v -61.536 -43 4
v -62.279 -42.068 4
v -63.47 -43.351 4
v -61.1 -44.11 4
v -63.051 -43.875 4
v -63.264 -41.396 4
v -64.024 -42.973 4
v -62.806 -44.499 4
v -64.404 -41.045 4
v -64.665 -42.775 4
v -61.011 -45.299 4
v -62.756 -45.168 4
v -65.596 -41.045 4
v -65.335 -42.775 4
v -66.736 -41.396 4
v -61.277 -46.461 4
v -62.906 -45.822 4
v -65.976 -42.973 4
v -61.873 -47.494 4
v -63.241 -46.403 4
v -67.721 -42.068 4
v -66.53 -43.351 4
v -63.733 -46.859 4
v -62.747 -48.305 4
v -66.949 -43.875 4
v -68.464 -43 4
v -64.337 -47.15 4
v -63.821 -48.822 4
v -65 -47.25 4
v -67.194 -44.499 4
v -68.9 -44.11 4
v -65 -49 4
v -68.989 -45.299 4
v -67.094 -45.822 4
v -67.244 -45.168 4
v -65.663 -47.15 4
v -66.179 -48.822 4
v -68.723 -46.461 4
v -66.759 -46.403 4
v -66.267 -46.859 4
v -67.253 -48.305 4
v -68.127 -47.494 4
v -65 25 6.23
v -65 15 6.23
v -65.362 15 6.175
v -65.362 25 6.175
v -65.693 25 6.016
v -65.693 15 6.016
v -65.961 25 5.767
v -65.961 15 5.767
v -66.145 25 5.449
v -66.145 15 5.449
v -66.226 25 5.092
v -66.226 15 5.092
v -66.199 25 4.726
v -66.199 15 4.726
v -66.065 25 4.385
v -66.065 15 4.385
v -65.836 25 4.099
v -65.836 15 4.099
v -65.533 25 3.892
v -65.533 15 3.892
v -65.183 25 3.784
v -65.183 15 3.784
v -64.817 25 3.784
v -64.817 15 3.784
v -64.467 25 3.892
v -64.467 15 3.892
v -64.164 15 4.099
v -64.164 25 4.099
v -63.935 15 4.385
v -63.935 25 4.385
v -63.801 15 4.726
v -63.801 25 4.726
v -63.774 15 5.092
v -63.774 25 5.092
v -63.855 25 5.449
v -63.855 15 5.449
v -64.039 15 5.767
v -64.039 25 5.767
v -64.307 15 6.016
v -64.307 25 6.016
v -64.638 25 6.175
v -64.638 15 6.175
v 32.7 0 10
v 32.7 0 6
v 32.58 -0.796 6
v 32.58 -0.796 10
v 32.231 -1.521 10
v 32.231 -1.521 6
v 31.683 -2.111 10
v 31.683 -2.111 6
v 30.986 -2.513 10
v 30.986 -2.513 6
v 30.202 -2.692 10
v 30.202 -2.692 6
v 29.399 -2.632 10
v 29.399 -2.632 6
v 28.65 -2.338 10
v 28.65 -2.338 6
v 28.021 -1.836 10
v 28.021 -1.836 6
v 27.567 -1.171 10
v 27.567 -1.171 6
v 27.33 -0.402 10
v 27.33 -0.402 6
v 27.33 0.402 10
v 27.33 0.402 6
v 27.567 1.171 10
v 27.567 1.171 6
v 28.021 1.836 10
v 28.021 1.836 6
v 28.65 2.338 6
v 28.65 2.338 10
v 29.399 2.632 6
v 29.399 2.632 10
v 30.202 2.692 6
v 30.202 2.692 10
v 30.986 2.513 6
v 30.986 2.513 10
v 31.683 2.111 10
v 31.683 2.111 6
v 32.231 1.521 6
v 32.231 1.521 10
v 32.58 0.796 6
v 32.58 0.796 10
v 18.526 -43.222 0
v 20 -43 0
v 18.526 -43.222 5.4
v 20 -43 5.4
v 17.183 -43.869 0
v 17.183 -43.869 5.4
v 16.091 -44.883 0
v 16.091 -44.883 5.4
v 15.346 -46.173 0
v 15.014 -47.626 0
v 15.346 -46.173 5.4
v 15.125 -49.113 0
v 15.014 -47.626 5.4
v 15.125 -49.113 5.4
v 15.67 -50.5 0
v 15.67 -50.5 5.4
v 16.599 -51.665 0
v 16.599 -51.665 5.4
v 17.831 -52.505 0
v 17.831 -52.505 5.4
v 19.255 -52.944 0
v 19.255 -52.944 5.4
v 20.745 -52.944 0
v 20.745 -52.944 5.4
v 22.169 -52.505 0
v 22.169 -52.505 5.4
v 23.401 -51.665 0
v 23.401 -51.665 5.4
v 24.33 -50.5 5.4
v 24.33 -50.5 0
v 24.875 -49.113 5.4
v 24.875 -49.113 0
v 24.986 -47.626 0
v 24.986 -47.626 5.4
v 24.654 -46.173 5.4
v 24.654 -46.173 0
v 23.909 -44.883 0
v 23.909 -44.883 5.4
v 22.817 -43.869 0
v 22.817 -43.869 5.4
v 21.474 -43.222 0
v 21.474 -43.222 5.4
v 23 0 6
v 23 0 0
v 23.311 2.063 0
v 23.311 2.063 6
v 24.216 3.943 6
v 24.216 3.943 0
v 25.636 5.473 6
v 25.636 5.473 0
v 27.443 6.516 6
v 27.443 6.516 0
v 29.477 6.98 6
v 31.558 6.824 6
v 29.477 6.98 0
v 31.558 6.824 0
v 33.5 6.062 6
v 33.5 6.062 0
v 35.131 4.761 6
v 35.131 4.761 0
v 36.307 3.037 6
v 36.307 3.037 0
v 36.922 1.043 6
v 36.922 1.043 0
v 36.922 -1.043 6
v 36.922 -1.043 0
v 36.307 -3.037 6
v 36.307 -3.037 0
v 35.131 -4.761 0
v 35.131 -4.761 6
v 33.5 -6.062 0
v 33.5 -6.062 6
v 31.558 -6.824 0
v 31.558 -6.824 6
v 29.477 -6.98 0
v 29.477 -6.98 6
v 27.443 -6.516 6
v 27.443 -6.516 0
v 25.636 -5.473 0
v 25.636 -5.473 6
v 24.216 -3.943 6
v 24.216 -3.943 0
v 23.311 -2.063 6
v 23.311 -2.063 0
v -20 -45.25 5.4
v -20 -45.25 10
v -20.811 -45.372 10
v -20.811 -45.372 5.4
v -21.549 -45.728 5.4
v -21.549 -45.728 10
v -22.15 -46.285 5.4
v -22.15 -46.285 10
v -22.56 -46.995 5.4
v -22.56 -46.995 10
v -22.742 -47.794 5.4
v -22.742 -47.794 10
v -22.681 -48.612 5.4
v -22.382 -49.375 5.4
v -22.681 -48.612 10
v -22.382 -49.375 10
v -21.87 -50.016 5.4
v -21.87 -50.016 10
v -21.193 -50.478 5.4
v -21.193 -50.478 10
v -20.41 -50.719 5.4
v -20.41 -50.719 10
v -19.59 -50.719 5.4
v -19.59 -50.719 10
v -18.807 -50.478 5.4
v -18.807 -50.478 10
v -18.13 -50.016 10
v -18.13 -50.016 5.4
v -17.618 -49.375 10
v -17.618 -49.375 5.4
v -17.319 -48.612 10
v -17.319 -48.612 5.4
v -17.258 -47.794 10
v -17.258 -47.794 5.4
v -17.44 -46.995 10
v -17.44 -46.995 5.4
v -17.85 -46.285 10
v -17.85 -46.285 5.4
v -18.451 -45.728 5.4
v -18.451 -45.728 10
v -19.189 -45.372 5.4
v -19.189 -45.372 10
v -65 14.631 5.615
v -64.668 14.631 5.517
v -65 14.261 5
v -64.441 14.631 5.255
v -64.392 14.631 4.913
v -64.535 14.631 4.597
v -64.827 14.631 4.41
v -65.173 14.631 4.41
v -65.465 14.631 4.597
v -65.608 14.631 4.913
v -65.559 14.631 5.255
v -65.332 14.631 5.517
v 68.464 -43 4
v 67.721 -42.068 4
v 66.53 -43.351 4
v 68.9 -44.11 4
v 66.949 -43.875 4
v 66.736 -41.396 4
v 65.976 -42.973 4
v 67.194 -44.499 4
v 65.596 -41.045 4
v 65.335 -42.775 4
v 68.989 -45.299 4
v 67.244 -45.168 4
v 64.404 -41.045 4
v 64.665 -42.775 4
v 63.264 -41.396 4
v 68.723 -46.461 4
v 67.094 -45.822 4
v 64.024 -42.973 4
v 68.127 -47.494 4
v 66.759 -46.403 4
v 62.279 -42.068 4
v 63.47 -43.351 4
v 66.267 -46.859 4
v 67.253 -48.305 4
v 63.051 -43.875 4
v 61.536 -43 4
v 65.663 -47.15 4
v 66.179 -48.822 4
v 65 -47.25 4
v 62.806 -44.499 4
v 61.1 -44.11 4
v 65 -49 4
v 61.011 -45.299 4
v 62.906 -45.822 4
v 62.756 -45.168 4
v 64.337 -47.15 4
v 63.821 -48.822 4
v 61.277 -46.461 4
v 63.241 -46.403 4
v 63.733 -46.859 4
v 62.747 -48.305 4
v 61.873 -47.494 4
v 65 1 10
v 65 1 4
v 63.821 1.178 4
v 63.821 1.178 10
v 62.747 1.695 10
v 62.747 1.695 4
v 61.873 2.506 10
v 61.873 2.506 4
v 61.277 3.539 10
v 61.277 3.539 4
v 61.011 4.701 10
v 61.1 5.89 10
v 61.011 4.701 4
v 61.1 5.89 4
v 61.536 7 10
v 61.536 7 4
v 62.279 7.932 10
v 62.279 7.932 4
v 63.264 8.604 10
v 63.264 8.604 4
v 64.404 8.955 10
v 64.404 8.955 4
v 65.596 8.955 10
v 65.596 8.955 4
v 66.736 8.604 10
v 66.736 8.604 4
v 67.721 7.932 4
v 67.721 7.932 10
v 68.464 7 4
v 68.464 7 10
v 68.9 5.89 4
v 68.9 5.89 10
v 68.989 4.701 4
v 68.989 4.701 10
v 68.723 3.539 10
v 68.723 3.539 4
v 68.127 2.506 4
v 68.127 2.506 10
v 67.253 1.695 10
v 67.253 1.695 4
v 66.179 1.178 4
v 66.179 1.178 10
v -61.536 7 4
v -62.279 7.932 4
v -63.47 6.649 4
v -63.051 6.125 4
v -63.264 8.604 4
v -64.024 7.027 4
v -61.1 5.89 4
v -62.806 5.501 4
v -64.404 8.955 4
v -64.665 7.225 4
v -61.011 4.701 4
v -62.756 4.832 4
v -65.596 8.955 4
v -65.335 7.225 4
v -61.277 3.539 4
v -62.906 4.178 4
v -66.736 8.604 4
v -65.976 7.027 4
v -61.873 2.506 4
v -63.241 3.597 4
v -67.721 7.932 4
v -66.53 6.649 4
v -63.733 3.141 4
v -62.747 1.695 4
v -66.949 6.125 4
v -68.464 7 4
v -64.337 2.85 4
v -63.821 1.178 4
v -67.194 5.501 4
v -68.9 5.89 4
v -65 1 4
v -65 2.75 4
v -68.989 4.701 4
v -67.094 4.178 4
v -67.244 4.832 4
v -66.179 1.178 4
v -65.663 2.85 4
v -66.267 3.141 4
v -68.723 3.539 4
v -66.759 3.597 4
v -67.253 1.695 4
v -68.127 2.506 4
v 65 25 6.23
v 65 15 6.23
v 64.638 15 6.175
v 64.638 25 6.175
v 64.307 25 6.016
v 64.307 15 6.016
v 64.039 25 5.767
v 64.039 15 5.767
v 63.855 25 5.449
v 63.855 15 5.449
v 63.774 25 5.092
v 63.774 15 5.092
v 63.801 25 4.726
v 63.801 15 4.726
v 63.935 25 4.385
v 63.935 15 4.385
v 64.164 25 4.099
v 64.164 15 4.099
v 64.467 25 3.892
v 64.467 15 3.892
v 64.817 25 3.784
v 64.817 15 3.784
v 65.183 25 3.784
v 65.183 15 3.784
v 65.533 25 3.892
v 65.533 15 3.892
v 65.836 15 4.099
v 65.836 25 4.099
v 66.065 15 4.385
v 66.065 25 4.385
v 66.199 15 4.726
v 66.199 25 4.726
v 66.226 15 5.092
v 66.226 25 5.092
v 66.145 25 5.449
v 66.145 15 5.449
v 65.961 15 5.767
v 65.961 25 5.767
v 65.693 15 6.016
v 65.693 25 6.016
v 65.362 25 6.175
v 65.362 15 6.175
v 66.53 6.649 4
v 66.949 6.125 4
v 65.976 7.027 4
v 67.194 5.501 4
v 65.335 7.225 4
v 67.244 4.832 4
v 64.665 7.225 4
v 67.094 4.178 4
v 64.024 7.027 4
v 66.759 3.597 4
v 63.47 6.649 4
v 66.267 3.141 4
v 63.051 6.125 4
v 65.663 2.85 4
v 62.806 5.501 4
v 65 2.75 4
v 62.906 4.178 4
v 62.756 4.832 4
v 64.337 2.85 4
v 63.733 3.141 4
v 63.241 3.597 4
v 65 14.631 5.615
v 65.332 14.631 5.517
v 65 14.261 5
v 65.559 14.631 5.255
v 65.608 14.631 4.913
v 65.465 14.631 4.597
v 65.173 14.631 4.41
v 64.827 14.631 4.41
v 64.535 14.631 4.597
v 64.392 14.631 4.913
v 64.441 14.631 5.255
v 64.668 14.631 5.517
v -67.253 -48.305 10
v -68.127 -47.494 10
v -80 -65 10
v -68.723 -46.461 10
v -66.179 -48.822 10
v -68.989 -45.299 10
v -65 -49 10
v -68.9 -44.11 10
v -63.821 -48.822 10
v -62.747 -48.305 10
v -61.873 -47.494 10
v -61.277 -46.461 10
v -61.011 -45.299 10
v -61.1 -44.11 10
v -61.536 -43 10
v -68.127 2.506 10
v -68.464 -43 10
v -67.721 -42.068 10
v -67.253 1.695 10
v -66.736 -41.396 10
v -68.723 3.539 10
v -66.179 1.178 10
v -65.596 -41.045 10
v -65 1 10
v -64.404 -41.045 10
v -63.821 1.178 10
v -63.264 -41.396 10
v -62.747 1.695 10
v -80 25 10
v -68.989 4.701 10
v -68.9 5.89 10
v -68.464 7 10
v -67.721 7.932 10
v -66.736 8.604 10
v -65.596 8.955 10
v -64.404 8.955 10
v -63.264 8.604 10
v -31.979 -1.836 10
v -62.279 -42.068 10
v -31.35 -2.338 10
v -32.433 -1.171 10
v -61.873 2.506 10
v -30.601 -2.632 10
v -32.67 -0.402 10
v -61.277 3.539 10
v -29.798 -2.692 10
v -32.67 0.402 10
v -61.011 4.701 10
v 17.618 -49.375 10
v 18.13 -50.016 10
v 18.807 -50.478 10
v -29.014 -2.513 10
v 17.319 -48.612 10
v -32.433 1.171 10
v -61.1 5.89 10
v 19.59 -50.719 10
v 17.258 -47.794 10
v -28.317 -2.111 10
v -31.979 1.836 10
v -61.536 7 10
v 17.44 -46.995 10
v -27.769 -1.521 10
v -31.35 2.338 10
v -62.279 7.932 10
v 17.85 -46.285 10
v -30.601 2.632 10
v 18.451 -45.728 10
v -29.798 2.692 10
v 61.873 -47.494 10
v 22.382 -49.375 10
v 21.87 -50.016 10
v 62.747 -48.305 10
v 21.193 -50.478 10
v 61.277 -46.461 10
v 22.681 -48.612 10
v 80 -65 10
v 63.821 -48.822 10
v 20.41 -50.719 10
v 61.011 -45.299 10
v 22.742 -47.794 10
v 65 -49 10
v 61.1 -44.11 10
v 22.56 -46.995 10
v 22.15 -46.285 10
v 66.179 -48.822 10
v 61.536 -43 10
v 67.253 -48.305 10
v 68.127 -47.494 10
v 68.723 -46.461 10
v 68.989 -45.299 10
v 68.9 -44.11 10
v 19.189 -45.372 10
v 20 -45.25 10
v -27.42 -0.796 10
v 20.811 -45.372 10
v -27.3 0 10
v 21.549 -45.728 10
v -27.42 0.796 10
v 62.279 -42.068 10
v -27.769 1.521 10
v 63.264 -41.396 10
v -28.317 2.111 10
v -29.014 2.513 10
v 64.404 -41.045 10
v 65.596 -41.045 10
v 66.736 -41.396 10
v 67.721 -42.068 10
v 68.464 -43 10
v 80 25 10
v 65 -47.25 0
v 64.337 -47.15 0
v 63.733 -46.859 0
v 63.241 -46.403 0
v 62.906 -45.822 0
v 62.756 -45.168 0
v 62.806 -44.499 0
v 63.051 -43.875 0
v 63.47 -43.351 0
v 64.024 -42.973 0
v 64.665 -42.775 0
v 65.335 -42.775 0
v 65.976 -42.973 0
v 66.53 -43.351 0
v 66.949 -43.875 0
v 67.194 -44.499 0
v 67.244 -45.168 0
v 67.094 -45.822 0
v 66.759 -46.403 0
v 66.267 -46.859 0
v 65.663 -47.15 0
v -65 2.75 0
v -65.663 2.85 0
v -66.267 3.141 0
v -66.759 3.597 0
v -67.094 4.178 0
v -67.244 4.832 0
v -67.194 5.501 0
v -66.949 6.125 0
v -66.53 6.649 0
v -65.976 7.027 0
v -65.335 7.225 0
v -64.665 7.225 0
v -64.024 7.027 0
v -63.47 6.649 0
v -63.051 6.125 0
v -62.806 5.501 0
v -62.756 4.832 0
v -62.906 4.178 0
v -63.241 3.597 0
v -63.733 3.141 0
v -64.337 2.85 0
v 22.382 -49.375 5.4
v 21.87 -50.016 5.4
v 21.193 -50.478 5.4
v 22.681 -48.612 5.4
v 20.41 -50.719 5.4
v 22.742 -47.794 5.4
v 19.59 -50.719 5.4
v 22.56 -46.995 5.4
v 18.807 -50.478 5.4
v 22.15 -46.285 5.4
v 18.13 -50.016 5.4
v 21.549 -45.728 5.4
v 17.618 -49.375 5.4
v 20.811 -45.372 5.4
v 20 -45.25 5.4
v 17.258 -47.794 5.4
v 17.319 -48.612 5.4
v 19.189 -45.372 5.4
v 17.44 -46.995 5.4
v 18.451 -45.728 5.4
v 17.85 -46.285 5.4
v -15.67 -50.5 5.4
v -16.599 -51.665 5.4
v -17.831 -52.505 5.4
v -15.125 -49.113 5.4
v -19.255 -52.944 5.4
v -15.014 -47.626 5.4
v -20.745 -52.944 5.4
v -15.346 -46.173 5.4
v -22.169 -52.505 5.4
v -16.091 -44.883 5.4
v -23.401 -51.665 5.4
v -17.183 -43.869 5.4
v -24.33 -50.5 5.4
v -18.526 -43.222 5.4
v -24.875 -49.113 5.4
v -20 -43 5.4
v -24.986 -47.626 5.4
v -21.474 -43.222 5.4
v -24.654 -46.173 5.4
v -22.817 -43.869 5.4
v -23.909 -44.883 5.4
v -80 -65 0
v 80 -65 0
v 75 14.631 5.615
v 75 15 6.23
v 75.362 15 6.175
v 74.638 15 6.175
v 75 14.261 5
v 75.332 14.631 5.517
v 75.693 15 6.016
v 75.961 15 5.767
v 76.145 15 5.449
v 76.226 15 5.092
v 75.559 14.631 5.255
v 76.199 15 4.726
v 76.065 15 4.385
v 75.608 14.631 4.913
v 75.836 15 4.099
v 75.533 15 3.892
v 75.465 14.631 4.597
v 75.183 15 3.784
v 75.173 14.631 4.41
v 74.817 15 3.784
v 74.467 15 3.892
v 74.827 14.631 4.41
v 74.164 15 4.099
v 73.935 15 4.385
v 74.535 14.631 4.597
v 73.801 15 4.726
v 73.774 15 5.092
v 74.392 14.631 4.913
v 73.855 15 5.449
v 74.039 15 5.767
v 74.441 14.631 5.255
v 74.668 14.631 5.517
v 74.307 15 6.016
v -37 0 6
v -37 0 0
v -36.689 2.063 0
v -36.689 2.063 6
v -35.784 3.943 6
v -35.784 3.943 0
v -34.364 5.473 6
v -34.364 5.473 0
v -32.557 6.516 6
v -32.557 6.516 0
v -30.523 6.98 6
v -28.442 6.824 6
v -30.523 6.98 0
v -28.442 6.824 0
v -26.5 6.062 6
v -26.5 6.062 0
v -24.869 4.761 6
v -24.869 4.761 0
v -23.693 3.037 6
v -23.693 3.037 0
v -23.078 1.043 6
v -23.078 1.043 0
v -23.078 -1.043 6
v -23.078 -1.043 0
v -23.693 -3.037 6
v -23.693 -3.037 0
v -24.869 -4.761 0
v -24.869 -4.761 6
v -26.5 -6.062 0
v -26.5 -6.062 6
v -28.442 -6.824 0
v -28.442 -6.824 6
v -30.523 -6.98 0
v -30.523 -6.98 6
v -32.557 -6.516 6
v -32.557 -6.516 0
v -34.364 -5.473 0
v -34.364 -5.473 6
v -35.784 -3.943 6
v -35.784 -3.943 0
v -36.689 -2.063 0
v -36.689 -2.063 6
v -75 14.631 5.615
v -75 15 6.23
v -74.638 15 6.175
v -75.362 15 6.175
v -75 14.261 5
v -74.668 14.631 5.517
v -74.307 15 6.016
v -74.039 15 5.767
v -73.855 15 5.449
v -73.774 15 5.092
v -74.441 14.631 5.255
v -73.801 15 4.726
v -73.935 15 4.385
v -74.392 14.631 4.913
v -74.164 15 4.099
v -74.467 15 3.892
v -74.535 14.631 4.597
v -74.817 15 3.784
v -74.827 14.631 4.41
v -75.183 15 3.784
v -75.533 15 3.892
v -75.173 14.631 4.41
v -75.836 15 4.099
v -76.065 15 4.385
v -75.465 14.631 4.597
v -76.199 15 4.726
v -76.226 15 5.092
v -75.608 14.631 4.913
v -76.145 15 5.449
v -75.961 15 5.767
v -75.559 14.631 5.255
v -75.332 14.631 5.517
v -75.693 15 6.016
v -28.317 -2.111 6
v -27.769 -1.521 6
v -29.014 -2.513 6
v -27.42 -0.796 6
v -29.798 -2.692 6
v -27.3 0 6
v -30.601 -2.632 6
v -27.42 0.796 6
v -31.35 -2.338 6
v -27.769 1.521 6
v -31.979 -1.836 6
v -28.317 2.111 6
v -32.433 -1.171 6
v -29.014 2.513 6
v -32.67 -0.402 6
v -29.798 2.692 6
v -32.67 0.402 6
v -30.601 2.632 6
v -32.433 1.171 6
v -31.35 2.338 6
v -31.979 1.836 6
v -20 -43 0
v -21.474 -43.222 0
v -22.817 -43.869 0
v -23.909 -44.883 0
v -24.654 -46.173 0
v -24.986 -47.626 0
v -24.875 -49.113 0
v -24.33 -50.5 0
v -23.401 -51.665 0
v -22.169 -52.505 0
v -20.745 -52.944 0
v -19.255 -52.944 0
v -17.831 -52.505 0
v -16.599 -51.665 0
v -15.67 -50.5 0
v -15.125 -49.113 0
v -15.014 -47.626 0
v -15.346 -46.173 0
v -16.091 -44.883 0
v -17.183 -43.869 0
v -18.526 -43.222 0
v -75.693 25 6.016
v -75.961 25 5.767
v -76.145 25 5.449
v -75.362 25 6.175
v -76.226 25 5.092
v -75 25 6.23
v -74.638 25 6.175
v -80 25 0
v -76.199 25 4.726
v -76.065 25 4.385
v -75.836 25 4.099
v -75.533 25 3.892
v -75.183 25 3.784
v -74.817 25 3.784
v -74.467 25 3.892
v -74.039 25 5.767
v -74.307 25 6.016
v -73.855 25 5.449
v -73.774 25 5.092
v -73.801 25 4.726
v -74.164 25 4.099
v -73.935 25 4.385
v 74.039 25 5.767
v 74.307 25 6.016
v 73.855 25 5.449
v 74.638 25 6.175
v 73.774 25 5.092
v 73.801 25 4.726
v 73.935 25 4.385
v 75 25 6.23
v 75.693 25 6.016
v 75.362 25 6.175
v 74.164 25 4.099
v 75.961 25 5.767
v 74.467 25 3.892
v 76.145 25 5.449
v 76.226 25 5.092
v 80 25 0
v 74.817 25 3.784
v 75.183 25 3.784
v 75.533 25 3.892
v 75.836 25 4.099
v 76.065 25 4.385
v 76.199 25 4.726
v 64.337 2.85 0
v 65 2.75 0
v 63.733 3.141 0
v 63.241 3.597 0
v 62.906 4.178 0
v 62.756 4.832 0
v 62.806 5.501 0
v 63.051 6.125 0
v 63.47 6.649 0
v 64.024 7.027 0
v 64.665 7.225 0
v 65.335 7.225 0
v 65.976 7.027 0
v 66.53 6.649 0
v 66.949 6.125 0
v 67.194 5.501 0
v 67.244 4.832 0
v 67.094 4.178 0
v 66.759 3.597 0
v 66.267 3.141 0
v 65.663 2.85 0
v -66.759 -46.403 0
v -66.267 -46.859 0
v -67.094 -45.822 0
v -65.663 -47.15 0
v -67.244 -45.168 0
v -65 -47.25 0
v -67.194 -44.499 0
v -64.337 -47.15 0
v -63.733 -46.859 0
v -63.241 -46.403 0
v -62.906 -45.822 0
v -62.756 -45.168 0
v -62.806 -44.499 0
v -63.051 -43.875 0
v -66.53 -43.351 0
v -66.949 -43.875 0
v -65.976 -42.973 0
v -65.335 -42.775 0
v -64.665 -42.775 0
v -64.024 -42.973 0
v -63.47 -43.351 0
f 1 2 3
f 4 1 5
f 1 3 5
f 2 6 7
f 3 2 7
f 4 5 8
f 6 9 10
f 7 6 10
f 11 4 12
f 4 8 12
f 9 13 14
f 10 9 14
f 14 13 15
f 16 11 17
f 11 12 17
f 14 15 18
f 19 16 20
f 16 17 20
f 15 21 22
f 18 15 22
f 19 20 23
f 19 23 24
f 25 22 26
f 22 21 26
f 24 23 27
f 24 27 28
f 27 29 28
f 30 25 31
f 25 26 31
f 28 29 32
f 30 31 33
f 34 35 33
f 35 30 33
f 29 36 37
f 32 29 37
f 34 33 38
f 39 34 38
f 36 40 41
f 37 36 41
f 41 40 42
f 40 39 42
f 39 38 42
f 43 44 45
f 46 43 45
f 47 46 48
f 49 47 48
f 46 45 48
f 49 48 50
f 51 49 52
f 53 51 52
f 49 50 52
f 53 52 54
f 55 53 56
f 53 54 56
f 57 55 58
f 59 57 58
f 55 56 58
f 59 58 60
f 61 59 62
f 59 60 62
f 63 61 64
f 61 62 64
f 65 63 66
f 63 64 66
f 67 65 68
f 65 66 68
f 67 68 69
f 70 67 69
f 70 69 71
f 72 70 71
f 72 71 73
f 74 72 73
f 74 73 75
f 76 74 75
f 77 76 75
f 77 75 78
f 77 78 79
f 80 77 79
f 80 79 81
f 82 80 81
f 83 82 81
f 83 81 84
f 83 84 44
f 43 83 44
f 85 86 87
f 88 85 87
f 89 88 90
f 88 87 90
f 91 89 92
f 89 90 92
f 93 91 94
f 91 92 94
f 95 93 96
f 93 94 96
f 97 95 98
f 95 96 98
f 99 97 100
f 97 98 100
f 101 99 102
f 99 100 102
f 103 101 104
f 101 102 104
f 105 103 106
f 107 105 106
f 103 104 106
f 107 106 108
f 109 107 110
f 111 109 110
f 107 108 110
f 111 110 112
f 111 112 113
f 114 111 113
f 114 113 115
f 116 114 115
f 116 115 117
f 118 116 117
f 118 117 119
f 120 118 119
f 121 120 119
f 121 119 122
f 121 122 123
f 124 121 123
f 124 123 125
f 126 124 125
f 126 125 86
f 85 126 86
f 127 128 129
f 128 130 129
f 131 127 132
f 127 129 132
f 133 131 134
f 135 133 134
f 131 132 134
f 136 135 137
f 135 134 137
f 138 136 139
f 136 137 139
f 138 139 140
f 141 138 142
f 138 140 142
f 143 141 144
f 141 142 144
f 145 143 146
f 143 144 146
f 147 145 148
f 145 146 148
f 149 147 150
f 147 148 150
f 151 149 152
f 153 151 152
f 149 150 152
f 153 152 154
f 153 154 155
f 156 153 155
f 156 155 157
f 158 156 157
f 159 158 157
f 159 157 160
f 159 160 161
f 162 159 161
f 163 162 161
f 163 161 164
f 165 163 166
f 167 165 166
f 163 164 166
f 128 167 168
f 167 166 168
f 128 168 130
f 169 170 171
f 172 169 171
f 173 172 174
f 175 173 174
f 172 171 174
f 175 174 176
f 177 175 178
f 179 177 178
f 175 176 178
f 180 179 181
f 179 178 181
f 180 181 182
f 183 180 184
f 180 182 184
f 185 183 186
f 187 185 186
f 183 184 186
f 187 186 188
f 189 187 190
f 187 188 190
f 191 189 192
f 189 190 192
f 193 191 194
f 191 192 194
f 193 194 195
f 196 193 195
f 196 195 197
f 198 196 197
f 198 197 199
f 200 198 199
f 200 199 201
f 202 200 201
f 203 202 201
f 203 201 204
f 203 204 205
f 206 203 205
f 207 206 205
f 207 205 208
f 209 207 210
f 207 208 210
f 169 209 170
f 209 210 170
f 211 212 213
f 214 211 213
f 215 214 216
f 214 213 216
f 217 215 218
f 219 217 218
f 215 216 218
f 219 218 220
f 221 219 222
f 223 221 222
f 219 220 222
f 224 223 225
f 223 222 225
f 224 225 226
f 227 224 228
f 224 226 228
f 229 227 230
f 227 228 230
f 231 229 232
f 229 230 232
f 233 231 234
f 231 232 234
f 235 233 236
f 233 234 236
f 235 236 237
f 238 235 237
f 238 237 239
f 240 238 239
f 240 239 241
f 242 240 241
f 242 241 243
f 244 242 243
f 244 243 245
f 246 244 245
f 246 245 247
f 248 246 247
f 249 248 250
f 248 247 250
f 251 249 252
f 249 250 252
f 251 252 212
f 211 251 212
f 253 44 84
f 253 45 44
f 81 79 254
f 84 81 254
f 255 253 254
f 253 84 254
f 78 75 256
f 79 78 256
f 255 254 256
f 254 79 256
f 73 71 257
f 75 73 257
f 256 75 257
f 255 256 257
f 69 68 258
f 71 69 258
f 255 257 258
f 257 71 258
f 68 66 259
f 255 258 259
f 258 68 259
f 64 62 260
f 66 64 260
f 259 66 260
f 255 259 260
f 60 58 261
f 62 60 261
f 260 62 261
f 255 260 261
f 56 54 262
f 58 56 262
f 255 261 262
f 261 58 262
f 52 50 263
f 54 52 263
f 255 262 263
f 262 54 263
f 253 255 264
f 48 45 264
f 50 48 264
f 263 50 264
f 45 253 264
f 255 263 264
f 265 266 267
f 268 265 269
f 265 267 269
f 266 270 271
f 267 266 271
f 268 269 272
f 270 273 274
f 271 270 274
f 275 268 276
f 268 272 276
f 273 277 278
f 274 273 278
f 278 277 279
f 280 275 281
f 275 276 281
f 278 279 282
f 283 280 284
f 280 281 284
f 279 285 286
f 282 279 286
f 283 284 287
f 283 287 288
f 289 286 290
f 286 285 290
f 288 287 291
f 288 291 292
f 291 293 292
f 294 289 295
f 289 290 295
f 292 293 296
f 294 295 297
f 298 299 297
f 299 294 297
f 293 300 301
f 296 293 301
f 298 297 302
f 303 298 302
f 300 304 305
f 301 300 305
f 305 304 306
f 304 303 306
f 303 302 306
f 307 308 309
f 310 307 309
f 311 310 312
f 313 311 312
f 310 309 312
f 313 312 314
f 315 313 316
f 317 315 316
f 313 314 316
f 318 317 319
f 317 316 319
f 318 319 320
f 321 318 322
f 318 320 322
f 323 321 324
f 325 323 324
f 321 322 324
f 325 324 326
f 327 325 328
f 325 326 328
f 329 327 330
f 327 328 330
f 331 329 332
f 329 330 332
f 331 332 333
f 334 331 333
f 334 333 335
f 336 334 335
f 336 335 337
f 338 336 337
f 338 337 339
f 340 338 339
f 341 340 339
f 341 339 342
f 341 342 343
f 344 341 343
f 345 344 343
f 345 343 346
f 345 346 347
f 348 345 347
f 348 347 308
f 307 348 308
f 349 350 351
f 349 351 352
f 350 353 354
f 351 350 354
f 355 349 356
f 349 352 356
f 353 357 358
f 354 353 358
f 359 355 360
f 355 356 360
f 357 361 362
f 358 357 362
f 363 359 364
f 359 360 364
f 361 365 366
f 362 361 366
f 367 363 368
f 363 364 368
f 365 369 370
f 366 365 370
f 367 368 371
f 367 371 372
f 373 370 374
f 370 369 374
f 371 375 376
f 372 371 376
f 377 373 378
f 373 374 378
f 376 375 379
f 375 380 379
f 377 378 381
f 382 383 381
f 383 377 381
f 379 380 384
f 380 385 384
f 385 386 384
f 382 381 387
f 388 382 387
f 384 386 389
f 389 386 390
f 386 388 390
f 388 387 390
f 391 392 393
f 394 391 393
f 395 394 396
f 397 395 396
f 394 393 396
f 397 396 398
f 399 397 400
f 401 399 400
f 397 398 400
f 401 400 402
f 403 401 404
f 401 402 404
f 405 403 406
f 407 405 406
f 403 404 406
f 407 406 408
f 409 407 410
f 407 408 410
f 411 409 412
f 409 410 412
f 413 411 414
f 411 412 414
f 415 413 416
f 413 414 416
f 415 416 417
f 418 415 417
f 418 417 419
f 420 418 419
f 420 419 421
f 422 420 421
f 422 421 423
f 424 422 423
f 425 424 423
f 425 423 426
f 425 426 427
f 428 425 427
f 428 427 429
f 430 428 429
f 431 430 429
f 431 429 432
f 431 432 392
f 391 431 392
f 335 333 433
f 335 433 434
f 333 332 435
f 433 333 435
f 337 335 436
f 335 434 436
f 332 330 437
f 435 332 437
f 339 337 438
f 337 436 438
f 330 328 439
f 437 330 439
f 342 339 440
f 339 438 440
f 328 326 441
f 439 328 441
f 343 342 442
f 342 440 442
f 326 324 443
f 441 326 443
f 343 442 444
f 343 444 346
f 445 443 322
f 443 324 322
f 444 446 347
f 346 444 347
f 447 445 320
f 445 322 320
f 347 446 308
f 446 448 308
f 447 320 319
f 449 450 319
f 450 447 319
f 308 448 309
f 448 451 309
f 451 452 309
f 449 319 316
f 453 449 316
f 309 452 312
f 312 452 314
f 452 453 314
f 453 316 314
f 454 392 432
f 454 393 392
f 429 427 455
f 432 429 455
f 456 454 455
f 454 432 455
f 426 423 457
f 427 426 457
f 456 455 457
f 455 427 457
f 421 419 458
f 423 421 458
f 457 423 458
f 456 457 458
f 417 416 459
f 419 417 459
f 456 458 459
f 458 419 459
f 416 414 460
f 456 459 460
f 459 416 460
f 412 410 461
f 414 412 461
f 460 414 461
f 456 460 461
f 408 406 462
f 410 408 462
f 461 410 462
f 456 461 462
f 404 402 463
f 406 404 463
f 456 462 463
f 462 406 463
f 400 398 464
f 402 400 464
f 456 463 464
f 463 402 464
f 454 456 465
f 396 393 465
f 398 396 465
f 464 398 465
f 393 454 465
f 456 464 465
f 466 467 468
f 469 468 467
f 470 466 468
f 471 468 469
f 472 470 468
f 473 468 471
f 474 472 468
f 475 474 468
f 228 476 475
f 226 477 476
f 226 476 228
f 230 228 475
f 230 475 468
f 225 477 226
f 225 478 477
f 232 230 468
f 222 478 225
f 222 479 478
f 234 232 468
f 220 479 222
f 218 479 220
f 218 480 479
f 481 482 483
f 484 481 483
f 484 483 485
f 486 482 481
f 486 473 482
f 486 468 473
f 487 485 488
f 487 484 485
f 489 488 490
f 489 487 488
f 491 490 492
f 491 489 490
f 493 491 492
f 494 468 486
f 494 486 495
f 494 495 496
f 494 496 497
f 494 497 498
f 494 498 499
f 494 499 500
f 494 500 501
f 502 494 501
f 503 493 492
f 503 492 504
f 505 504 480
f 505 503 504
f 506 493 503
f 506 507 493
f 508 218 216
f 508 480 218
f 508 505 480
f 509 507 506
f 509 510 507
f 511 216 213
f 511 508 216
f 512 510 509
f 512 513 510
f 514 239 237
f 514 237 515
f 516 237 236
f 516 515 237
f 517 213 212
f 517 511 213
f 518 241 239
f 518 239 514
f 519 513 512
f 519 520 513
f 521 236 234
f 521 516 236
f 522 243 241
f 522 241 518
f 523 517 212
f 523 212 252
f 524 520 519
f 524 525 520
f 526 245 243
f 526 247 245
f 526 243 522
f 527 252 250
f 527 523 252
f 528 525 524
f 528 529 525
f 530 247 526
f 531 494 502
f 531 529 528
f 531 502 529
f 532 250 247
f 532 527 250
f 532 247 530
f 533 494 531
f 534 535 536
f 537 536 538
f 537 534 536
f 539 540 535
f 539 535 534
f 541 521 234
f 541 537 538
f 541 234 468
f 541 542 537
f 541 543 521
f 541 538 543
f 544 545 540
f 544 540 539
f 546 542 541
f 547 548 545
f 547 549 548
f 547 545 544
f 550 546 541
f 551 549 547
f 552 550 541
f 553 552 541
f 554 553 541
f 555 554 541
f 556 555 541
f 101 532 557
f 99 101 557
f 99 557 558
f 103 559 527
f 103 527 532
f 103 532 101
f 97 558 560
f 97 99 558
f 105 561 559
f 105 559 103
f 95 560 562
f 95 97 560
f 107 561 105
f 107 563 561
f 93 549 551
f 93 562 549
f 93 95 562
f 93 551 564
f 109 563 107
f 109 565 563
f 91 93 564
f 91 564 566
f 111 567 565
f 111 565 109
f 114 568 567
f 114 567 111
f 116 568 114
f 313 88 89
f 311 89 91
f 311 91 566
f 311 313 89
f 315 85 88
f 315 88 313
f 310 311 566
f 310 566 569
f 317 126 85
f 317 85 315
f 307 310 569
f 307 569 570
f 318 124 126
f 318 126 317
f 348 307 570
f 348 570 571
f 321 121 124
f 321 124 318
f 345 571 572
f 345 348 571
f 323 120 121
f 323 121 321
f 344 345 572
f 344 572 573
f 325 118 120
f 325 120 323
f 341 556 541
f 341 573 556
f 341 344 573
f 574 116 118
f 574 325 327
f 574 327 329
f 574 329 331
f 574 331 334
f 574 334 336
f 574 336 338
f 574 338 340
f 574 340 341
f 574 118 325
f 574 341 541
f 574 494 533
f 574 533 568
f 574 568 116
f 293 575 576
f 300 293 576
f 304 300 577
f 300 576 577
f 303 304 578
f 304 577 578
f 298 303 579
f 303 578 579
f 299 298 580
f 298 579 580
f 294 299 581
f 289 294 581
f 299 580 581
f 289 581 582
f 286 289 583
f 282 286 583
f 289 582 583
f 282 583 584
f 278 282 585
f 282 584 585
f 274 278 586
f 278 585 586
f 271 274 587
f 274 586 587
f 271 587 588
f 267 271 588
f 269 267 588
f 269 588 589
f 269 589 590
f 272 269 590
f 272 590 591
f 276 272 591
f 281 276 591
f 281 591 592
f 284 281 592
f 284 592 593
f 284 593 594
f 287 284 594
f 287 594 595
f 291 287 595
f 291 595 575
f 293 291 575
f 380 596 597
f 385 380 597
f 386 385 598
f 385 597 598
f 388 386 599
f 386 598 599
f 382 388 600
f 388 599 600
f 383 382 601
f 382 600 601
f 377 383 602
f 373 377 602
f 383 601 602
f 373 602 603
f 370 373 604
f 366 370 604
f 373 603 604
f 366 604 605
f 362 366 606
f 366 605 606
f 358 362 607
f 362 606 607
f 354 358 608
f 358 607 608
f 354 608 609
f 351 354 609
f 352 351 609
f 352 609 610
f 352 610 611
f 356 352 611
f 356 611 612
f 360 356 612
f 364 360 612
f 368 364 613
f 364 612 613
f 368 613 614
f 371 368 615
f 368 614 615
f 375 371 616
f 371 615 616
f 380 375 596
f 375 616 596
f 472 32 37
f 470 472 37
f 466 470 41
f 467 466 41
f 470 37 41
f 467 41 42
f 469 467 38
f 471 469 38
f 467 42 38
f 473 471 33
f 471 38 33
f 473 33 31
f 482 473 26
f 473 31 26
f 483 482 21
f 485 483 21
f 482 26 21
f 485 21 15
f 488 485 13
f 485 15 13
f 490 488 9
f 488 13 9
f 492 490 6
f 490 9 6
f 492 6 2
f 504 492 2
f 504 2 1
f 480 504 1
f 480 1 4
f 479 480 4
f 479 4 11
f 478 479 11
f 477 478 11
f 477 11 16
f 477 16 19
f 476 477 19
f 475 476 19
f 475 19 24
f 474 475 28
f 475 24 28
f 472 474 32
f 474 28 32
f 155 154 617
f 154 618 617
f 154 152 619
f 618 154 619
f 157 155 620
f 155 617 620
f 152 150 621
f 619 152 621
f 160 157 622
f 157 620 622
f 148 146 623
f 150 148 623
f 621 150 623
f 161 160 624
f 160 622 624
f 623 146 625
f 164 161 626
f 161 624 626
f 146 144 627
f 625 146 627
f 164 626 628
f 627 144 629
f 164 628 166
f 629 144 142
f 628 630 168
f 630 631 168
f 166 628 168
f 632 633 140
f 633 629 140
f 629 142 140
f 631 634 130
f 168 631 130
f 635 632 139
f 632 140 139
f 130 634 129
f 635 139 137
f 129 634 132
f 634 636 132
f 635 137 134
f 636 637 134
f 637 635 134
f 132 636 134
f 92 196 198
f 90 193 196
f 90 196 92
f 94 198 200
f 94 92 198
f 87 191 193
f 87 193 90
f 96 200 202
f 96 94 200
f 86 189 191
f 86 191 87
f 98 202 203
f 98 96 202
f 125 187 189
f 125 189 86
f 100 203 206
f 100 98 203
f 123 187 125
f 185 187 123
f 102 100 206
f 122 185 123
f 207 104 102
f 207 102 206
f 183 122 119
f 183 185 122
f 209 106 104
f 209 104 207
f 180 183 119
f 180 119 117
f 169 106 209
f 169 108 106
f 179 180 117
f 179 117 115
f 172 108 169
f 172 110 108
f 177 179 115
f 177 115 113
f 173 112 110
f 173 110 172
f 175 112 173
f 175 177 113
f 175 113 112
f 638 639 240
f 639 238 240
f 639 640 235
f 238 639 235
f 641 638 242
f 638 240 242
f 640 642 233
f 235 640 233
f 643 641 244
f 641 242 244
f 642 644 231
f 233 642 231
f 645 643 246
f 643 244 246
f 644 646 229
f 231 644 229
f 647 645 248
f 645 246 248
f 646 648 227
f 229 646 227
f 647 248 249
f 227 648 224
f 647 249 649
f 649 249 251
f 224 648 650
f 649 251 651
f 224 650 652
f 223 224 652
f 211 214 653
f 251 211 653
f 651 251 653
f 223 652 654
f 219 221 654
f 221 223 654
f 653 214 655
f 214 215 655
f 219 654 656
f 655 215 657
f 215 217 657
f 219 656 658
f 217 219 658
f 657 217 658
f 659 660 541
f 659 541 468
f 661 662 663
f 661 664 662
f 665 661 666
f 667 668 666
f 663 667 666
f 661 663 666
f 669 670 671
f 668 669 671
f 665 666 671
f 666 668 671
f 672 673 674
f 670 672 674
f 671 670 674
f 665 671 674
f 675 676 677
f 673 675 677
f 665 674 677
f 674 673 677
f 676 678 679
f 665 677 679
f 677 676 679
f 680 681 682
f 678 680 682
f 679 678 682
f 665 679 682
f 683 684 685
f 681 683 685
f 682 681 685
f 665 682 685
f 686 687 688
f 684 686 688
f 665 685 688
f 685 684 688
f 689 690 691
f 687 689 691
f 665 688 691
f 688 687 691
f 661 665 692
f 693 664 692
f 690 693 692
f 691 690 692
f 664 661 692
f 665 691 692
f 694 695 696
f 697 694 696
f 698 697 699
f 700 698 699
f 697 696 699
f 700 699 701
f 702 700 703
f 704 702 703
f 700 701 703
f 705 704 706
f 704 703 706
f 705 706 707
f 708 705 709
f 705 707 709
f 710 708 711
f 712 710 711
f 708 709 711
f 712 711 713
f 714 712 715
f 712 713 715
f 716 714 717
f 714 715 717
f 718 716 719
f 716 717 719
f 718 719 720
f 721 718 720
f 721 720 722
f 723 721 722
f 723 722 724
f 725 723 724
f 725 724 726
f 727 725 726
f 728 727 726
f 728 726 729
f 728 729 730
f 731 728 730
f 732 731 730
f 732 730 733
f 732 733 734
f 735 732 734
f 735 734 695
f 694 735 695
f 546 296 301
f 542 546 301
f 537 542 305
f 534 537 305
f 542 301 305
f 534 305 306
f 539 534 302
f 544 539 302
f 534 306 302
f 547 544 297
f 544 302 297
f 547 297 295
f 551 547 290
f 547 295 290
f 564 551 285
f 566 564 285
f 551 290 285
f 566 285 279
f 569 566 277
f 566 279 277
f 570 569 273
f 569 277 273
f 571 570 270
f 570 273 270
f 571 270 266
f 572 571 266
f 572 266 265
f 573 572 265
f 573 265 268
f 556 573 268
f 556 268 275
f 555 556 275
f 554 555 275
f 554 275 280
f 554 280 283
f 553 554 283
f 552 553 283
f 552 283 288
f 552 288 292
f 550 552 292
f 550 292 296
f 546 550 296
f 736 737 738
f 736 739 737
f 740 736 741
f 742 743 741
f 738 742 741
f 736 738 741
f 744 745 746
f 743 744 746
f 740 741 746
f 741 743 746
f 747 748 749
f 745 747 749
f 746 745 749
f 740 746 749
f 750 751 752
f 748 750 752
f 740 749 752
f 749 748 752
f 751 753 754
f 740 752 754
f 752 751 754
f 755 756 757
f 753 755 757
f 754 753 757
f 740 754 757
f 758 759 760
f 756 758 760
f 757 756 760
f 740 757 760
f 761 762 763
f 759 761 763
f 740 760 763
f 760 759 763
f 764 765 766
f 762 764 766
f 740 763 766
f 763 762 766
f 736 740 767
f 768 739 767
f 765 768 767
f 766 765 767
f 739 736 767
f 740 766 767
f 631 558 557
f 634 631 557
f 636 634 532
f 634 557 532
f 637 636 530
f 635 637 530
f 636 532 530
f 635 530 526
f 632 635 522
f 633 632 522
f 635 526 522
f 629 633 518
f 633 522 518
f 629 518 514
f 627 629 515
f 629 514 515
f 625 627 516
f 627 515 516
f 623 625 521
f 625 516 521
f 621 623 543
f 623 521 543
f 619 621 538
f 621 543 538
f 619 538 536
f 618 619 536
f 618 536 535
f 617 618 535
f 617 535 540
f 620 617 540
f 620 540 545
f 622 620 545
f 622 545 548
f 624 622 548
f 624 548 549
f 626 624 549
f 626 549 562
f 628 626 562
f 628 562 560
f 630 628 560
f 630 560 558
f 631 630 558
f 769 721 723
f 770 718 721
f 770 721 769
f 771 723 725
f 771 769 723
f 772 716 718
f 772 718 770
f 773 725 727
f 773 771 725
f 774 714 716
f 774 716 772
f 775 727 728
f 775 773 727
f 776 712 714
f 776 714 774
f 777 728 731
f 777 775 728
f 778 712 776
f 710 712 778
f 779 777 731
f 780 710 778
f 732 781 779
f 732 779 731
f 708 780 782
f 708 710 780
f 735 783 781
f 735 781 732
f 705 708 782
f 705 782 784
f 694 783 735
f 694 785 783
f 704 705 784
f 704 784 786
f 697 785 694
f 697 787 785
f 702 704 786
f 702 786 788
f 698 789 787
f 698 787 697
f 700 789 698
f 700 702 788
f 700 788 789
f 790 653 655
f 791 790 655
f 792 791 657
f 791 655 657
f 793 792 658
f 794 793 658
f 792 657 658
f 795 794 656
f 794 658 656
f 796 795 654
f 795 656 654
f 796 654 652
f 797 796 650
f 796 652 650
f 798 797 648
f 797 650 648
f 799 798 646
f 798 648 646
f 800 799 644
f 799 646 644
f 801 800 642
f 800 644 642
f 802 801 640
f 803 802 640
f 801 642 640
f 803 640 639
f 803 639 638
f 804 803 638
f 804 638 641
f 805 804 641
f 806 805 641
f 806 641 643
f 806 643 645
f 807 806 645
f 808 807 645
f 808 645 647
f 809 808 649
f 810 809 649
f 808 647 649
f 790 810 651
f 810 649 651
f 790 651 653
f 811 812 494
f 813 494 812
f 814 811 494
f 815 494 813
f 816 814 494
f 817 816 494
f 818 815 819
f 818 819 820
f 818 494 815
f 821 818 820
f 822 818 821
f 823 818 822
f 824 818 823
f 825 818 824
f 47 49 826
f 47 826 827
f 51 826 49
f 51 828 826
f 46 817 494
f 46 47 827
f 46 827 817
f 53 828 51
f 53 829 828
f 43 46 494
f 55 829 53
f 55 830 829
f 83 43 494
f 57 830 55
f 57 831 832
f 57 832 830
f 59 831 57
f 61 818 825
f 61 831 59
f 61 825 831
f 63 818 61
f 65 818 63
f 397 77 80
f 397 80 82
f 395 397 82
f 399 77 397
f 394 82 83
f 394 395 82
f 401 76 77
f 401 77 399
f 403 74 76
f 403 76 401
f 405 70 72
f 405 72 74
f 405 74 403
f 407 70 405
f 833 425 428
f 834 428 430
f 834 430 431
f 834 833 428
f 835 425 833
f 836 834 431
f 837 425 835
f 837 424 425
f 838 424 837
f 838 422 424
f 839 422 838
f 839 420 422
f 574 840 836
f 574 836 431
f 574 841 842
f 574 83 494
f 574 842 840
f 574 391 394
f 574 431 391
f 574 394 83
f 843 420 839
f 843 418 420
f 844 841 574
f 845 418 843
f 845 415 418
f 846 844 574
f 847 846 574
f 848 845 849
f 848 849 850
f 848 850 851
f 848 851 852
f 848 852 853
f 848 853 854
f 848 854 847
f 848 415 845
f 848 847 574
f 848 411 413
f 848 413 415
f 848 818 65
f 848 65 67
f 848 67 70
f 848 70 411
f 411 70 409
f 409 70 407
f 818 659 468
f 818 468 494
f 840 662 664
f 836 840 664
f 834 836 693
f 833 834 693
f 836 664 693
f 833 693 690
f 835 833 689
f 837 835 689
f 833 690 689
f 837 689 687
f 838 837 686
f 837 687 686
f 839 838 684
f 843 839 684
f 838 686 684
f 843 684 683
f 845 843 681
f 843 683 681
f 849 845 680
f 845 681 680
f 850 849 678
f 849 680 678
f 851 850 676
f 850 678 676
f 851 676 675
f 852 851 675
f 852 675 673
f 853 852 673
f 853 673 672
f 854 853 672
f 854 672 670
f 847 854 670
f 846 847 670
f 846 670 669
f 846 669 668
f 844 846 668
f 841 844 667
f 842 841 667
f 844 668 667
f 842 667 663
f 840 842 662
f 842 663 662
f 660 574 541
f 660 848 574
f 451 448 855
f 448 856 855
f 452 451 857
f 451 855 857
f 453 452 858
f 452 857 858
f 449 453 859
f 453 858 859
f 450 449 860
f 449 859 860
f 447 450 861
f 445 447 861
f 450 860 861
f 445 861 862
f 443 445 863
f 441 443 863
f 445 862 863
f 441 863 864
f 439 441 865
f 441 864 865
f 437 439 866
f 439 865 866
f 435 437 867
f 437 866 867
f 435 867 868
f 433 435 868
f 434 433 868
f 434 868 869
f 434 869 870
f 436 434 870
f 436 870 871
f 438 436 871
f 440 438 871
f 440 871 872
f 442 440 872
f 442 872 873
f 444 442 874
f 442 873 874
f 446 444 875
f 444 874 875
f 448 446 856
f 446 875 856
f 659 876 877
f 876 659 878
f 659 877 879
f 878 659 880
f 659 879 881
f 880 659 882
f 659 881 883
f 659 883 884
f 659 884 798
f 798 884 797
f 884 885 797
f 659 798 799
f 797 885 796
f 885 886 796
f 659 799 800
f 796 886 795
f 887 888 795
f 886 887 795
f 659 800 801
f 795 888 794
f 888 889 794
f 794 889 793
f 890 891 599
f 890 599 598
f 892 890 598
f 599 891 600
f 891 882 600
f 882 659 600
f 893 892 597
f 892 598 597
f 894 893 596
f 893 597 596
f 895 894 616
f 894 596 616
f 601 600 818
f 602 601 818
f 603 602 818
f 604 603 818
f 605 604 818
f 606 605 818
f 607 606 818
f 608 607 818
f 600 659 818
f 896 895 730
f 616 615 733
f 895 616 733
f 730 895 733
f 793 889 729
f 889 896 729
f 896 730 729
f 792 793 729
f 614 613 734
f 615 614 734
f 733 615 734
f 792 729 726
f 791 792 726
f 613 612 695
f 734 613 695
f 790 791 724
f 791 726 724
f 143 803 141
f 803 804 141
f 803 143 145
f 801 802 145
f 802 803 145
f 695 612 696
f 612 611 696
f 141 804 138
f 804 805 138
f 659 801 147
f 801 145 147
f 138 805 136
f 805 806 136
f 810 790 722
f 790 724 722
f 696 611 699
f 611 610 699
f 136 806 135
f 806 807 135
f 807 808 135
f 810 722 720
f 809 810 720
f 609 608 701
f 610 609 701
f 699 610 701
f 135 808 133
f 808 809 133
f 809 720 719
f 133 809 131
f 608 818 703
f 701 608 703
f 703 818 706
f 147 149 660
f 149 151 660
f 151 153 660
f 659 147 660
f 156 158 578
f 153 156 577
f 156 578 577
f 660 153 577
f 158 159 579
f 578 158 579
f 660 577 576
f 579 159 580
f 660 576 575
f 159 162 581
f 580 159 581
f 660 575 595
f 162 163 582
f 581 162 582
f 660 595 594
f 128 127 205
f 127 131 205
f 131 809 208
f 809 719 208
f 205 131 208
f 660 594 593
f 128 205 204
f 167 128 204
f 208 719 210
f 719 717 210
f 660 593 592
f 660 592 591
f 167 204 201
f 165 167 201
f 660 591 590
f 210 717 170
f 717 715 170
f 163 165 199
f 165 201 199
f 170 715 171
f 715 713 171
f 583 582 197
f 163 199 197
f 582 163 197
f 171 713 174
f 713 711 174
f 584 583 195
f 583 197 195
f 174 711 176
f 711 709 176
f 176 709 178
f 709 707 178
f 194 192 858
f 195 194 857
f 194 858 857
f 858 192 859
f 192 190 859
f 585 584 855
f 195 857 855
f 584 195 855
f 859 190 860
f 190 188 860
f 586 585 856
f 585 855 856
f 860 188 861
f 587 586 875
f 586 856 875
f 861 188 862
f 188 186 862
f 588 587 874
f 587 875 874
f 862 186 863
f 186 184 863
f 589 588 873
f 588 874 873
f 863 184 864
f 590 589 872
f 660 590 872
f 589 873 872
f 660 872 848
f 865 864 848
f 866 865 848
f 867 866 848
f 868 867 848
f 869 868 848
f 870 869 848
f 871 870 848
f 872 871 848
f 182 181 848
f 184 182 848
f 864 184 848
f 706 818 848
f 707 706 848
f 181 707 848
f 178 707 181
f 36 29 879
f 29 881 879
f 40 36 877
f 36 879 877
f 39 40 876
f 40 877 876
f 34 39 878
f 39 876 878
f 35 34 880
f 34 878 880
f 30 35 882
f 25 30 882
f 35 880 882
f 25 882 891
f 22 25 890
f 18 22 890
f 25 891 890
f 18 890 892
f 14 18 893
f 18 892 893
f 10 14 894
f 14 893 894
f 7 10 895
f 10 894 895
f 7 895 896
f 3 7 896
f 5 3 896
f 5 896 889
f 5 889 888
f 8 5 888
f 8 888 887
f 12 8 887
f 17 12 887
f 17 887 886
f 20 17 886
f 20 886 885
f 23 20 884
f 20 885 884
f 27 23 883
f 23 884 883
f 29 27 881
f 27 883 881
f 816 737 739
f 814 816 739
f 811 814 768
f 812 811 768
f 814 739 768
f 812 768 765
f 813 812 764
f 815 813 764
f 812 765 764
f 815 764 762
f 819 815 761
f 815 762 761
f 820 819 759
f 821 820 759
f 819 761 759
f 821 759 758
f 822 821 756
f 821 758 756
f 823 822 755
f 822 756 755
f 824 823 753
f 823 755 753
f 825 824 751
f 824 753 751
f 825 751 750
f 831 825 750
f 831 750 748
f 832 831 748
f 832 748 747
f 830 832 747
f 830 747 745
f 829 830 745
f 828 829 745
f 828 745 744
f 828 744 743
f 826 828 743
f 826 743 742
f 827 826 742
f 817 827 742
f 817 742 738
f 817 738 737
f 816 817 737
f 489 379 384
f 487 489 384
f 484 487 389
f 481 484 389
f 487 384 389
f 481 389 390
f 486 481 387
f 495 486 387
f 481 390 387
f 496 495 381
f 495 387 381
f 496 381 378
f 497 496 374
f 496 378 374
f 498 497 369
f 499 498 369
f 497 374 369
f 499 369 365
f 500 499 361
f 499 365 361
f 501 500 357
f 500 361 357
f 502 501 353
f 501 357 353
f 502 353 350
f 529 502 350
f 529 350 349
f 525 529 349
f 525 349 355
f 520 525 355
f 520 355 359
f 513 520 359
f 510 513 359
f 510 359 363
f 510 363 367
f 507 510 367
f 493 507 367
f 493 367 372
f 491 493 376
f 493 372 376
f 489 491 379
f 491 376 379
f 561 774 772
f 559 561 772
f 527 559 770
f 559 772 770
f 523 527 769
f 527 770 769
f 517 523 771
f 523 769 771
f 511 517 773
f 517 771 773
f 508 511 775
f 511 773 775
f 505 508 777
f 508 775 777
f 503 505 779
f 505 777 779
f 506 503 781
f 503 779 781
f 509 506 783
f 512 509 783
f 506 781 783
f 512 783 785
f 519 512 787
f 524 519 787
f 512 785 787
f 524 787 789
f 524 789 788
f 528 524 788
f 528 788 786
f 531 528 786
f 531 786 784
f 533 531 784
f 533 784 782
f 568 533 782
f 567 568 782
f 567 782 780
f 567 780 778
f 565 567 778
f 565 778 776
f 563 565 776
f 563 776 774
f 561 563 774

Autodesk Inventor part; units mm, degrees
ref_plane "YZ Plane" through (0, 0, 0) normal (1, 0, 0) x (0, 1, 0)
ref_plane "XZ Plane" through (0, 0, 0) normal (0, 1, 0) x (-1, 0, 0)
ref_plane "XY Plane" through (0, 0, 0) normal (0, 0, 1) x (1, 0, 0)
sketch "Skizze1" plane through (0, 0, 0) normal (0, 0, 1) x (1, 0, 0)
  line L0 (-80, 25) -> (80, 25)
  line L1 (80, 25) -> (80, -65)
  line L2 (80, -65) -> (-80, -65)
  line L3 (-80, -65) -> (-80, 25)
  line L4 (-112, 0) -> (112, 0) projected
  line L5 (0, -83) -> (0, 43) projected
  circle A0 centre (-30, 0) radius 2.7
  circle A1 centre (30, 0) radius 2.7
  point P0 (0, 0)
  dimension "d0" = 25
  dimension "d1" = 160
  dimension "d2" = 60
  dimension "d3" = 5.4
  dimension "d4" = 90
extrude "Extrusion1" add sketch "Skizze1" along normal blind 10 contours L0 L5 L4 A0 L3 | L0 L1 L4 A1 L5 | L4 A0 L5 L2 L3 | L4 A1 L1 L2 L5
sketch "Skizze2" plane through (0, 0, 0) normal (0, 0, -1) x (-1, 0, 0)
  circle A0 centre (-30, 0) radius 2.7 projected
  circle A1 centre (30, 0) radius 2.7 projected
  circle A2 centre (-30, 0) radius 7
  circle A3 centre (30, 0) radius 7
  point P0 (0, 0)
  dimension "d7" = 14
extrude "Extrusion2" cut sketch "Skizze2" against normal blind 6
sketch "Skizze3" plane through (0, 0, 0) normal (0, 0, -1) x (-1, 0, 0)
  circle A0 centre (12.5, -59) radius 2.067 projected
  circle A1 centre (-12.5, -59) radius 2.067 projected
  circle A2 centre (-12.5, -37) radius 2.067 projected
  circle A3 centre (12.5, -37) radius 2.067 projected
  line L0 (30, -31) -> (30, -65) projected
  line L1 (30, -65) -> (-30, -65) projected
  line L2 (-30, -65) -> (-30, -31) projected
  line L3 (-30, -31) -> (30, -31) projected
  line L4 (-30, -48) -> (30, -48)
  line L5 (0, -31) -> (0, -65)
  circle A4 centre (-20, -48) radius 2.067 projected
  circle A5 centre (20, -48) radius 2.067 projected
  point P0 (0, 0)
  point P1 (-20, -48)
  point P2 (20, -48)
  dimension "d10" = 40
hole "Bohrung1" at (20, -48, 0) at (-20, -48, 0) direction (0, 0, 1) diameter 5.5 end through all counterbore diameter 10 counterbore depth 5.4
sketch "Skizze4" plane through (-80, 25, 0) normal (0, 1, 0) x (1, 0, 0)
  line L0 (0, -10) -> (160, -10) projected
  line L1 (160, 0) -> (160, -10) projected
  line L2 (0, 0) -> (0, -10) projected
  line L3 (160, -5) -> (0, -5)
  line L4 (80, 0) -> (80, -10)
  point P0 (155, -5)
  point P1 (145, -5)
  point P2 (5, -5)
  point P3 (15, -5)
  dimension "d18" = 5
  dimension "d19" = 10
hole "Bohrung2" at (75, 25, 5) at (65, 25, 5) at (-75, 25, 5) at (-65, 25, 5) direction (0, -1, 0) diameter 2.459 depth 10 tip angle 118 thread size "M3x0.5" class "6H" standard "ISO Metric profile"
sketch "Skizze5" plane through (0, 0, 10) normal (0, 0, 1) x (1, 0, 0)
  line L0 (80, 25) -> (80, -65) projected
  line L1 (-80, 25) -> (80, 25) projected
  line L2 (-80, -65) -> (-80, 25) projected
  line L3 (80, -65) -> (-80, -65) projected
  line L4 (0, -65) -> (0, 25)
  line L5 (-80, -20) -> (80, -20)
  line L6 (-65, 5) -> (65, 5)
  line L7 (65, 5) -> (65, -45)
  line L8 (65, -45) -> (-65, -45)
  line L9 (-65, -45) -> (-65, 5)
  point P0 (0, 0)
  dimension "d27" = 130
  dimension "d28" = 50
hole "Bohrung3" at (-65, 5, 10) at (65, 5, 10) at (65, -45, 10) at (-65, -45, 10) direction (0, 0, -1) diameter 4.5 end through all counterbore diameter 8 counterbore depth 6
properties part number "1_0204_010"
